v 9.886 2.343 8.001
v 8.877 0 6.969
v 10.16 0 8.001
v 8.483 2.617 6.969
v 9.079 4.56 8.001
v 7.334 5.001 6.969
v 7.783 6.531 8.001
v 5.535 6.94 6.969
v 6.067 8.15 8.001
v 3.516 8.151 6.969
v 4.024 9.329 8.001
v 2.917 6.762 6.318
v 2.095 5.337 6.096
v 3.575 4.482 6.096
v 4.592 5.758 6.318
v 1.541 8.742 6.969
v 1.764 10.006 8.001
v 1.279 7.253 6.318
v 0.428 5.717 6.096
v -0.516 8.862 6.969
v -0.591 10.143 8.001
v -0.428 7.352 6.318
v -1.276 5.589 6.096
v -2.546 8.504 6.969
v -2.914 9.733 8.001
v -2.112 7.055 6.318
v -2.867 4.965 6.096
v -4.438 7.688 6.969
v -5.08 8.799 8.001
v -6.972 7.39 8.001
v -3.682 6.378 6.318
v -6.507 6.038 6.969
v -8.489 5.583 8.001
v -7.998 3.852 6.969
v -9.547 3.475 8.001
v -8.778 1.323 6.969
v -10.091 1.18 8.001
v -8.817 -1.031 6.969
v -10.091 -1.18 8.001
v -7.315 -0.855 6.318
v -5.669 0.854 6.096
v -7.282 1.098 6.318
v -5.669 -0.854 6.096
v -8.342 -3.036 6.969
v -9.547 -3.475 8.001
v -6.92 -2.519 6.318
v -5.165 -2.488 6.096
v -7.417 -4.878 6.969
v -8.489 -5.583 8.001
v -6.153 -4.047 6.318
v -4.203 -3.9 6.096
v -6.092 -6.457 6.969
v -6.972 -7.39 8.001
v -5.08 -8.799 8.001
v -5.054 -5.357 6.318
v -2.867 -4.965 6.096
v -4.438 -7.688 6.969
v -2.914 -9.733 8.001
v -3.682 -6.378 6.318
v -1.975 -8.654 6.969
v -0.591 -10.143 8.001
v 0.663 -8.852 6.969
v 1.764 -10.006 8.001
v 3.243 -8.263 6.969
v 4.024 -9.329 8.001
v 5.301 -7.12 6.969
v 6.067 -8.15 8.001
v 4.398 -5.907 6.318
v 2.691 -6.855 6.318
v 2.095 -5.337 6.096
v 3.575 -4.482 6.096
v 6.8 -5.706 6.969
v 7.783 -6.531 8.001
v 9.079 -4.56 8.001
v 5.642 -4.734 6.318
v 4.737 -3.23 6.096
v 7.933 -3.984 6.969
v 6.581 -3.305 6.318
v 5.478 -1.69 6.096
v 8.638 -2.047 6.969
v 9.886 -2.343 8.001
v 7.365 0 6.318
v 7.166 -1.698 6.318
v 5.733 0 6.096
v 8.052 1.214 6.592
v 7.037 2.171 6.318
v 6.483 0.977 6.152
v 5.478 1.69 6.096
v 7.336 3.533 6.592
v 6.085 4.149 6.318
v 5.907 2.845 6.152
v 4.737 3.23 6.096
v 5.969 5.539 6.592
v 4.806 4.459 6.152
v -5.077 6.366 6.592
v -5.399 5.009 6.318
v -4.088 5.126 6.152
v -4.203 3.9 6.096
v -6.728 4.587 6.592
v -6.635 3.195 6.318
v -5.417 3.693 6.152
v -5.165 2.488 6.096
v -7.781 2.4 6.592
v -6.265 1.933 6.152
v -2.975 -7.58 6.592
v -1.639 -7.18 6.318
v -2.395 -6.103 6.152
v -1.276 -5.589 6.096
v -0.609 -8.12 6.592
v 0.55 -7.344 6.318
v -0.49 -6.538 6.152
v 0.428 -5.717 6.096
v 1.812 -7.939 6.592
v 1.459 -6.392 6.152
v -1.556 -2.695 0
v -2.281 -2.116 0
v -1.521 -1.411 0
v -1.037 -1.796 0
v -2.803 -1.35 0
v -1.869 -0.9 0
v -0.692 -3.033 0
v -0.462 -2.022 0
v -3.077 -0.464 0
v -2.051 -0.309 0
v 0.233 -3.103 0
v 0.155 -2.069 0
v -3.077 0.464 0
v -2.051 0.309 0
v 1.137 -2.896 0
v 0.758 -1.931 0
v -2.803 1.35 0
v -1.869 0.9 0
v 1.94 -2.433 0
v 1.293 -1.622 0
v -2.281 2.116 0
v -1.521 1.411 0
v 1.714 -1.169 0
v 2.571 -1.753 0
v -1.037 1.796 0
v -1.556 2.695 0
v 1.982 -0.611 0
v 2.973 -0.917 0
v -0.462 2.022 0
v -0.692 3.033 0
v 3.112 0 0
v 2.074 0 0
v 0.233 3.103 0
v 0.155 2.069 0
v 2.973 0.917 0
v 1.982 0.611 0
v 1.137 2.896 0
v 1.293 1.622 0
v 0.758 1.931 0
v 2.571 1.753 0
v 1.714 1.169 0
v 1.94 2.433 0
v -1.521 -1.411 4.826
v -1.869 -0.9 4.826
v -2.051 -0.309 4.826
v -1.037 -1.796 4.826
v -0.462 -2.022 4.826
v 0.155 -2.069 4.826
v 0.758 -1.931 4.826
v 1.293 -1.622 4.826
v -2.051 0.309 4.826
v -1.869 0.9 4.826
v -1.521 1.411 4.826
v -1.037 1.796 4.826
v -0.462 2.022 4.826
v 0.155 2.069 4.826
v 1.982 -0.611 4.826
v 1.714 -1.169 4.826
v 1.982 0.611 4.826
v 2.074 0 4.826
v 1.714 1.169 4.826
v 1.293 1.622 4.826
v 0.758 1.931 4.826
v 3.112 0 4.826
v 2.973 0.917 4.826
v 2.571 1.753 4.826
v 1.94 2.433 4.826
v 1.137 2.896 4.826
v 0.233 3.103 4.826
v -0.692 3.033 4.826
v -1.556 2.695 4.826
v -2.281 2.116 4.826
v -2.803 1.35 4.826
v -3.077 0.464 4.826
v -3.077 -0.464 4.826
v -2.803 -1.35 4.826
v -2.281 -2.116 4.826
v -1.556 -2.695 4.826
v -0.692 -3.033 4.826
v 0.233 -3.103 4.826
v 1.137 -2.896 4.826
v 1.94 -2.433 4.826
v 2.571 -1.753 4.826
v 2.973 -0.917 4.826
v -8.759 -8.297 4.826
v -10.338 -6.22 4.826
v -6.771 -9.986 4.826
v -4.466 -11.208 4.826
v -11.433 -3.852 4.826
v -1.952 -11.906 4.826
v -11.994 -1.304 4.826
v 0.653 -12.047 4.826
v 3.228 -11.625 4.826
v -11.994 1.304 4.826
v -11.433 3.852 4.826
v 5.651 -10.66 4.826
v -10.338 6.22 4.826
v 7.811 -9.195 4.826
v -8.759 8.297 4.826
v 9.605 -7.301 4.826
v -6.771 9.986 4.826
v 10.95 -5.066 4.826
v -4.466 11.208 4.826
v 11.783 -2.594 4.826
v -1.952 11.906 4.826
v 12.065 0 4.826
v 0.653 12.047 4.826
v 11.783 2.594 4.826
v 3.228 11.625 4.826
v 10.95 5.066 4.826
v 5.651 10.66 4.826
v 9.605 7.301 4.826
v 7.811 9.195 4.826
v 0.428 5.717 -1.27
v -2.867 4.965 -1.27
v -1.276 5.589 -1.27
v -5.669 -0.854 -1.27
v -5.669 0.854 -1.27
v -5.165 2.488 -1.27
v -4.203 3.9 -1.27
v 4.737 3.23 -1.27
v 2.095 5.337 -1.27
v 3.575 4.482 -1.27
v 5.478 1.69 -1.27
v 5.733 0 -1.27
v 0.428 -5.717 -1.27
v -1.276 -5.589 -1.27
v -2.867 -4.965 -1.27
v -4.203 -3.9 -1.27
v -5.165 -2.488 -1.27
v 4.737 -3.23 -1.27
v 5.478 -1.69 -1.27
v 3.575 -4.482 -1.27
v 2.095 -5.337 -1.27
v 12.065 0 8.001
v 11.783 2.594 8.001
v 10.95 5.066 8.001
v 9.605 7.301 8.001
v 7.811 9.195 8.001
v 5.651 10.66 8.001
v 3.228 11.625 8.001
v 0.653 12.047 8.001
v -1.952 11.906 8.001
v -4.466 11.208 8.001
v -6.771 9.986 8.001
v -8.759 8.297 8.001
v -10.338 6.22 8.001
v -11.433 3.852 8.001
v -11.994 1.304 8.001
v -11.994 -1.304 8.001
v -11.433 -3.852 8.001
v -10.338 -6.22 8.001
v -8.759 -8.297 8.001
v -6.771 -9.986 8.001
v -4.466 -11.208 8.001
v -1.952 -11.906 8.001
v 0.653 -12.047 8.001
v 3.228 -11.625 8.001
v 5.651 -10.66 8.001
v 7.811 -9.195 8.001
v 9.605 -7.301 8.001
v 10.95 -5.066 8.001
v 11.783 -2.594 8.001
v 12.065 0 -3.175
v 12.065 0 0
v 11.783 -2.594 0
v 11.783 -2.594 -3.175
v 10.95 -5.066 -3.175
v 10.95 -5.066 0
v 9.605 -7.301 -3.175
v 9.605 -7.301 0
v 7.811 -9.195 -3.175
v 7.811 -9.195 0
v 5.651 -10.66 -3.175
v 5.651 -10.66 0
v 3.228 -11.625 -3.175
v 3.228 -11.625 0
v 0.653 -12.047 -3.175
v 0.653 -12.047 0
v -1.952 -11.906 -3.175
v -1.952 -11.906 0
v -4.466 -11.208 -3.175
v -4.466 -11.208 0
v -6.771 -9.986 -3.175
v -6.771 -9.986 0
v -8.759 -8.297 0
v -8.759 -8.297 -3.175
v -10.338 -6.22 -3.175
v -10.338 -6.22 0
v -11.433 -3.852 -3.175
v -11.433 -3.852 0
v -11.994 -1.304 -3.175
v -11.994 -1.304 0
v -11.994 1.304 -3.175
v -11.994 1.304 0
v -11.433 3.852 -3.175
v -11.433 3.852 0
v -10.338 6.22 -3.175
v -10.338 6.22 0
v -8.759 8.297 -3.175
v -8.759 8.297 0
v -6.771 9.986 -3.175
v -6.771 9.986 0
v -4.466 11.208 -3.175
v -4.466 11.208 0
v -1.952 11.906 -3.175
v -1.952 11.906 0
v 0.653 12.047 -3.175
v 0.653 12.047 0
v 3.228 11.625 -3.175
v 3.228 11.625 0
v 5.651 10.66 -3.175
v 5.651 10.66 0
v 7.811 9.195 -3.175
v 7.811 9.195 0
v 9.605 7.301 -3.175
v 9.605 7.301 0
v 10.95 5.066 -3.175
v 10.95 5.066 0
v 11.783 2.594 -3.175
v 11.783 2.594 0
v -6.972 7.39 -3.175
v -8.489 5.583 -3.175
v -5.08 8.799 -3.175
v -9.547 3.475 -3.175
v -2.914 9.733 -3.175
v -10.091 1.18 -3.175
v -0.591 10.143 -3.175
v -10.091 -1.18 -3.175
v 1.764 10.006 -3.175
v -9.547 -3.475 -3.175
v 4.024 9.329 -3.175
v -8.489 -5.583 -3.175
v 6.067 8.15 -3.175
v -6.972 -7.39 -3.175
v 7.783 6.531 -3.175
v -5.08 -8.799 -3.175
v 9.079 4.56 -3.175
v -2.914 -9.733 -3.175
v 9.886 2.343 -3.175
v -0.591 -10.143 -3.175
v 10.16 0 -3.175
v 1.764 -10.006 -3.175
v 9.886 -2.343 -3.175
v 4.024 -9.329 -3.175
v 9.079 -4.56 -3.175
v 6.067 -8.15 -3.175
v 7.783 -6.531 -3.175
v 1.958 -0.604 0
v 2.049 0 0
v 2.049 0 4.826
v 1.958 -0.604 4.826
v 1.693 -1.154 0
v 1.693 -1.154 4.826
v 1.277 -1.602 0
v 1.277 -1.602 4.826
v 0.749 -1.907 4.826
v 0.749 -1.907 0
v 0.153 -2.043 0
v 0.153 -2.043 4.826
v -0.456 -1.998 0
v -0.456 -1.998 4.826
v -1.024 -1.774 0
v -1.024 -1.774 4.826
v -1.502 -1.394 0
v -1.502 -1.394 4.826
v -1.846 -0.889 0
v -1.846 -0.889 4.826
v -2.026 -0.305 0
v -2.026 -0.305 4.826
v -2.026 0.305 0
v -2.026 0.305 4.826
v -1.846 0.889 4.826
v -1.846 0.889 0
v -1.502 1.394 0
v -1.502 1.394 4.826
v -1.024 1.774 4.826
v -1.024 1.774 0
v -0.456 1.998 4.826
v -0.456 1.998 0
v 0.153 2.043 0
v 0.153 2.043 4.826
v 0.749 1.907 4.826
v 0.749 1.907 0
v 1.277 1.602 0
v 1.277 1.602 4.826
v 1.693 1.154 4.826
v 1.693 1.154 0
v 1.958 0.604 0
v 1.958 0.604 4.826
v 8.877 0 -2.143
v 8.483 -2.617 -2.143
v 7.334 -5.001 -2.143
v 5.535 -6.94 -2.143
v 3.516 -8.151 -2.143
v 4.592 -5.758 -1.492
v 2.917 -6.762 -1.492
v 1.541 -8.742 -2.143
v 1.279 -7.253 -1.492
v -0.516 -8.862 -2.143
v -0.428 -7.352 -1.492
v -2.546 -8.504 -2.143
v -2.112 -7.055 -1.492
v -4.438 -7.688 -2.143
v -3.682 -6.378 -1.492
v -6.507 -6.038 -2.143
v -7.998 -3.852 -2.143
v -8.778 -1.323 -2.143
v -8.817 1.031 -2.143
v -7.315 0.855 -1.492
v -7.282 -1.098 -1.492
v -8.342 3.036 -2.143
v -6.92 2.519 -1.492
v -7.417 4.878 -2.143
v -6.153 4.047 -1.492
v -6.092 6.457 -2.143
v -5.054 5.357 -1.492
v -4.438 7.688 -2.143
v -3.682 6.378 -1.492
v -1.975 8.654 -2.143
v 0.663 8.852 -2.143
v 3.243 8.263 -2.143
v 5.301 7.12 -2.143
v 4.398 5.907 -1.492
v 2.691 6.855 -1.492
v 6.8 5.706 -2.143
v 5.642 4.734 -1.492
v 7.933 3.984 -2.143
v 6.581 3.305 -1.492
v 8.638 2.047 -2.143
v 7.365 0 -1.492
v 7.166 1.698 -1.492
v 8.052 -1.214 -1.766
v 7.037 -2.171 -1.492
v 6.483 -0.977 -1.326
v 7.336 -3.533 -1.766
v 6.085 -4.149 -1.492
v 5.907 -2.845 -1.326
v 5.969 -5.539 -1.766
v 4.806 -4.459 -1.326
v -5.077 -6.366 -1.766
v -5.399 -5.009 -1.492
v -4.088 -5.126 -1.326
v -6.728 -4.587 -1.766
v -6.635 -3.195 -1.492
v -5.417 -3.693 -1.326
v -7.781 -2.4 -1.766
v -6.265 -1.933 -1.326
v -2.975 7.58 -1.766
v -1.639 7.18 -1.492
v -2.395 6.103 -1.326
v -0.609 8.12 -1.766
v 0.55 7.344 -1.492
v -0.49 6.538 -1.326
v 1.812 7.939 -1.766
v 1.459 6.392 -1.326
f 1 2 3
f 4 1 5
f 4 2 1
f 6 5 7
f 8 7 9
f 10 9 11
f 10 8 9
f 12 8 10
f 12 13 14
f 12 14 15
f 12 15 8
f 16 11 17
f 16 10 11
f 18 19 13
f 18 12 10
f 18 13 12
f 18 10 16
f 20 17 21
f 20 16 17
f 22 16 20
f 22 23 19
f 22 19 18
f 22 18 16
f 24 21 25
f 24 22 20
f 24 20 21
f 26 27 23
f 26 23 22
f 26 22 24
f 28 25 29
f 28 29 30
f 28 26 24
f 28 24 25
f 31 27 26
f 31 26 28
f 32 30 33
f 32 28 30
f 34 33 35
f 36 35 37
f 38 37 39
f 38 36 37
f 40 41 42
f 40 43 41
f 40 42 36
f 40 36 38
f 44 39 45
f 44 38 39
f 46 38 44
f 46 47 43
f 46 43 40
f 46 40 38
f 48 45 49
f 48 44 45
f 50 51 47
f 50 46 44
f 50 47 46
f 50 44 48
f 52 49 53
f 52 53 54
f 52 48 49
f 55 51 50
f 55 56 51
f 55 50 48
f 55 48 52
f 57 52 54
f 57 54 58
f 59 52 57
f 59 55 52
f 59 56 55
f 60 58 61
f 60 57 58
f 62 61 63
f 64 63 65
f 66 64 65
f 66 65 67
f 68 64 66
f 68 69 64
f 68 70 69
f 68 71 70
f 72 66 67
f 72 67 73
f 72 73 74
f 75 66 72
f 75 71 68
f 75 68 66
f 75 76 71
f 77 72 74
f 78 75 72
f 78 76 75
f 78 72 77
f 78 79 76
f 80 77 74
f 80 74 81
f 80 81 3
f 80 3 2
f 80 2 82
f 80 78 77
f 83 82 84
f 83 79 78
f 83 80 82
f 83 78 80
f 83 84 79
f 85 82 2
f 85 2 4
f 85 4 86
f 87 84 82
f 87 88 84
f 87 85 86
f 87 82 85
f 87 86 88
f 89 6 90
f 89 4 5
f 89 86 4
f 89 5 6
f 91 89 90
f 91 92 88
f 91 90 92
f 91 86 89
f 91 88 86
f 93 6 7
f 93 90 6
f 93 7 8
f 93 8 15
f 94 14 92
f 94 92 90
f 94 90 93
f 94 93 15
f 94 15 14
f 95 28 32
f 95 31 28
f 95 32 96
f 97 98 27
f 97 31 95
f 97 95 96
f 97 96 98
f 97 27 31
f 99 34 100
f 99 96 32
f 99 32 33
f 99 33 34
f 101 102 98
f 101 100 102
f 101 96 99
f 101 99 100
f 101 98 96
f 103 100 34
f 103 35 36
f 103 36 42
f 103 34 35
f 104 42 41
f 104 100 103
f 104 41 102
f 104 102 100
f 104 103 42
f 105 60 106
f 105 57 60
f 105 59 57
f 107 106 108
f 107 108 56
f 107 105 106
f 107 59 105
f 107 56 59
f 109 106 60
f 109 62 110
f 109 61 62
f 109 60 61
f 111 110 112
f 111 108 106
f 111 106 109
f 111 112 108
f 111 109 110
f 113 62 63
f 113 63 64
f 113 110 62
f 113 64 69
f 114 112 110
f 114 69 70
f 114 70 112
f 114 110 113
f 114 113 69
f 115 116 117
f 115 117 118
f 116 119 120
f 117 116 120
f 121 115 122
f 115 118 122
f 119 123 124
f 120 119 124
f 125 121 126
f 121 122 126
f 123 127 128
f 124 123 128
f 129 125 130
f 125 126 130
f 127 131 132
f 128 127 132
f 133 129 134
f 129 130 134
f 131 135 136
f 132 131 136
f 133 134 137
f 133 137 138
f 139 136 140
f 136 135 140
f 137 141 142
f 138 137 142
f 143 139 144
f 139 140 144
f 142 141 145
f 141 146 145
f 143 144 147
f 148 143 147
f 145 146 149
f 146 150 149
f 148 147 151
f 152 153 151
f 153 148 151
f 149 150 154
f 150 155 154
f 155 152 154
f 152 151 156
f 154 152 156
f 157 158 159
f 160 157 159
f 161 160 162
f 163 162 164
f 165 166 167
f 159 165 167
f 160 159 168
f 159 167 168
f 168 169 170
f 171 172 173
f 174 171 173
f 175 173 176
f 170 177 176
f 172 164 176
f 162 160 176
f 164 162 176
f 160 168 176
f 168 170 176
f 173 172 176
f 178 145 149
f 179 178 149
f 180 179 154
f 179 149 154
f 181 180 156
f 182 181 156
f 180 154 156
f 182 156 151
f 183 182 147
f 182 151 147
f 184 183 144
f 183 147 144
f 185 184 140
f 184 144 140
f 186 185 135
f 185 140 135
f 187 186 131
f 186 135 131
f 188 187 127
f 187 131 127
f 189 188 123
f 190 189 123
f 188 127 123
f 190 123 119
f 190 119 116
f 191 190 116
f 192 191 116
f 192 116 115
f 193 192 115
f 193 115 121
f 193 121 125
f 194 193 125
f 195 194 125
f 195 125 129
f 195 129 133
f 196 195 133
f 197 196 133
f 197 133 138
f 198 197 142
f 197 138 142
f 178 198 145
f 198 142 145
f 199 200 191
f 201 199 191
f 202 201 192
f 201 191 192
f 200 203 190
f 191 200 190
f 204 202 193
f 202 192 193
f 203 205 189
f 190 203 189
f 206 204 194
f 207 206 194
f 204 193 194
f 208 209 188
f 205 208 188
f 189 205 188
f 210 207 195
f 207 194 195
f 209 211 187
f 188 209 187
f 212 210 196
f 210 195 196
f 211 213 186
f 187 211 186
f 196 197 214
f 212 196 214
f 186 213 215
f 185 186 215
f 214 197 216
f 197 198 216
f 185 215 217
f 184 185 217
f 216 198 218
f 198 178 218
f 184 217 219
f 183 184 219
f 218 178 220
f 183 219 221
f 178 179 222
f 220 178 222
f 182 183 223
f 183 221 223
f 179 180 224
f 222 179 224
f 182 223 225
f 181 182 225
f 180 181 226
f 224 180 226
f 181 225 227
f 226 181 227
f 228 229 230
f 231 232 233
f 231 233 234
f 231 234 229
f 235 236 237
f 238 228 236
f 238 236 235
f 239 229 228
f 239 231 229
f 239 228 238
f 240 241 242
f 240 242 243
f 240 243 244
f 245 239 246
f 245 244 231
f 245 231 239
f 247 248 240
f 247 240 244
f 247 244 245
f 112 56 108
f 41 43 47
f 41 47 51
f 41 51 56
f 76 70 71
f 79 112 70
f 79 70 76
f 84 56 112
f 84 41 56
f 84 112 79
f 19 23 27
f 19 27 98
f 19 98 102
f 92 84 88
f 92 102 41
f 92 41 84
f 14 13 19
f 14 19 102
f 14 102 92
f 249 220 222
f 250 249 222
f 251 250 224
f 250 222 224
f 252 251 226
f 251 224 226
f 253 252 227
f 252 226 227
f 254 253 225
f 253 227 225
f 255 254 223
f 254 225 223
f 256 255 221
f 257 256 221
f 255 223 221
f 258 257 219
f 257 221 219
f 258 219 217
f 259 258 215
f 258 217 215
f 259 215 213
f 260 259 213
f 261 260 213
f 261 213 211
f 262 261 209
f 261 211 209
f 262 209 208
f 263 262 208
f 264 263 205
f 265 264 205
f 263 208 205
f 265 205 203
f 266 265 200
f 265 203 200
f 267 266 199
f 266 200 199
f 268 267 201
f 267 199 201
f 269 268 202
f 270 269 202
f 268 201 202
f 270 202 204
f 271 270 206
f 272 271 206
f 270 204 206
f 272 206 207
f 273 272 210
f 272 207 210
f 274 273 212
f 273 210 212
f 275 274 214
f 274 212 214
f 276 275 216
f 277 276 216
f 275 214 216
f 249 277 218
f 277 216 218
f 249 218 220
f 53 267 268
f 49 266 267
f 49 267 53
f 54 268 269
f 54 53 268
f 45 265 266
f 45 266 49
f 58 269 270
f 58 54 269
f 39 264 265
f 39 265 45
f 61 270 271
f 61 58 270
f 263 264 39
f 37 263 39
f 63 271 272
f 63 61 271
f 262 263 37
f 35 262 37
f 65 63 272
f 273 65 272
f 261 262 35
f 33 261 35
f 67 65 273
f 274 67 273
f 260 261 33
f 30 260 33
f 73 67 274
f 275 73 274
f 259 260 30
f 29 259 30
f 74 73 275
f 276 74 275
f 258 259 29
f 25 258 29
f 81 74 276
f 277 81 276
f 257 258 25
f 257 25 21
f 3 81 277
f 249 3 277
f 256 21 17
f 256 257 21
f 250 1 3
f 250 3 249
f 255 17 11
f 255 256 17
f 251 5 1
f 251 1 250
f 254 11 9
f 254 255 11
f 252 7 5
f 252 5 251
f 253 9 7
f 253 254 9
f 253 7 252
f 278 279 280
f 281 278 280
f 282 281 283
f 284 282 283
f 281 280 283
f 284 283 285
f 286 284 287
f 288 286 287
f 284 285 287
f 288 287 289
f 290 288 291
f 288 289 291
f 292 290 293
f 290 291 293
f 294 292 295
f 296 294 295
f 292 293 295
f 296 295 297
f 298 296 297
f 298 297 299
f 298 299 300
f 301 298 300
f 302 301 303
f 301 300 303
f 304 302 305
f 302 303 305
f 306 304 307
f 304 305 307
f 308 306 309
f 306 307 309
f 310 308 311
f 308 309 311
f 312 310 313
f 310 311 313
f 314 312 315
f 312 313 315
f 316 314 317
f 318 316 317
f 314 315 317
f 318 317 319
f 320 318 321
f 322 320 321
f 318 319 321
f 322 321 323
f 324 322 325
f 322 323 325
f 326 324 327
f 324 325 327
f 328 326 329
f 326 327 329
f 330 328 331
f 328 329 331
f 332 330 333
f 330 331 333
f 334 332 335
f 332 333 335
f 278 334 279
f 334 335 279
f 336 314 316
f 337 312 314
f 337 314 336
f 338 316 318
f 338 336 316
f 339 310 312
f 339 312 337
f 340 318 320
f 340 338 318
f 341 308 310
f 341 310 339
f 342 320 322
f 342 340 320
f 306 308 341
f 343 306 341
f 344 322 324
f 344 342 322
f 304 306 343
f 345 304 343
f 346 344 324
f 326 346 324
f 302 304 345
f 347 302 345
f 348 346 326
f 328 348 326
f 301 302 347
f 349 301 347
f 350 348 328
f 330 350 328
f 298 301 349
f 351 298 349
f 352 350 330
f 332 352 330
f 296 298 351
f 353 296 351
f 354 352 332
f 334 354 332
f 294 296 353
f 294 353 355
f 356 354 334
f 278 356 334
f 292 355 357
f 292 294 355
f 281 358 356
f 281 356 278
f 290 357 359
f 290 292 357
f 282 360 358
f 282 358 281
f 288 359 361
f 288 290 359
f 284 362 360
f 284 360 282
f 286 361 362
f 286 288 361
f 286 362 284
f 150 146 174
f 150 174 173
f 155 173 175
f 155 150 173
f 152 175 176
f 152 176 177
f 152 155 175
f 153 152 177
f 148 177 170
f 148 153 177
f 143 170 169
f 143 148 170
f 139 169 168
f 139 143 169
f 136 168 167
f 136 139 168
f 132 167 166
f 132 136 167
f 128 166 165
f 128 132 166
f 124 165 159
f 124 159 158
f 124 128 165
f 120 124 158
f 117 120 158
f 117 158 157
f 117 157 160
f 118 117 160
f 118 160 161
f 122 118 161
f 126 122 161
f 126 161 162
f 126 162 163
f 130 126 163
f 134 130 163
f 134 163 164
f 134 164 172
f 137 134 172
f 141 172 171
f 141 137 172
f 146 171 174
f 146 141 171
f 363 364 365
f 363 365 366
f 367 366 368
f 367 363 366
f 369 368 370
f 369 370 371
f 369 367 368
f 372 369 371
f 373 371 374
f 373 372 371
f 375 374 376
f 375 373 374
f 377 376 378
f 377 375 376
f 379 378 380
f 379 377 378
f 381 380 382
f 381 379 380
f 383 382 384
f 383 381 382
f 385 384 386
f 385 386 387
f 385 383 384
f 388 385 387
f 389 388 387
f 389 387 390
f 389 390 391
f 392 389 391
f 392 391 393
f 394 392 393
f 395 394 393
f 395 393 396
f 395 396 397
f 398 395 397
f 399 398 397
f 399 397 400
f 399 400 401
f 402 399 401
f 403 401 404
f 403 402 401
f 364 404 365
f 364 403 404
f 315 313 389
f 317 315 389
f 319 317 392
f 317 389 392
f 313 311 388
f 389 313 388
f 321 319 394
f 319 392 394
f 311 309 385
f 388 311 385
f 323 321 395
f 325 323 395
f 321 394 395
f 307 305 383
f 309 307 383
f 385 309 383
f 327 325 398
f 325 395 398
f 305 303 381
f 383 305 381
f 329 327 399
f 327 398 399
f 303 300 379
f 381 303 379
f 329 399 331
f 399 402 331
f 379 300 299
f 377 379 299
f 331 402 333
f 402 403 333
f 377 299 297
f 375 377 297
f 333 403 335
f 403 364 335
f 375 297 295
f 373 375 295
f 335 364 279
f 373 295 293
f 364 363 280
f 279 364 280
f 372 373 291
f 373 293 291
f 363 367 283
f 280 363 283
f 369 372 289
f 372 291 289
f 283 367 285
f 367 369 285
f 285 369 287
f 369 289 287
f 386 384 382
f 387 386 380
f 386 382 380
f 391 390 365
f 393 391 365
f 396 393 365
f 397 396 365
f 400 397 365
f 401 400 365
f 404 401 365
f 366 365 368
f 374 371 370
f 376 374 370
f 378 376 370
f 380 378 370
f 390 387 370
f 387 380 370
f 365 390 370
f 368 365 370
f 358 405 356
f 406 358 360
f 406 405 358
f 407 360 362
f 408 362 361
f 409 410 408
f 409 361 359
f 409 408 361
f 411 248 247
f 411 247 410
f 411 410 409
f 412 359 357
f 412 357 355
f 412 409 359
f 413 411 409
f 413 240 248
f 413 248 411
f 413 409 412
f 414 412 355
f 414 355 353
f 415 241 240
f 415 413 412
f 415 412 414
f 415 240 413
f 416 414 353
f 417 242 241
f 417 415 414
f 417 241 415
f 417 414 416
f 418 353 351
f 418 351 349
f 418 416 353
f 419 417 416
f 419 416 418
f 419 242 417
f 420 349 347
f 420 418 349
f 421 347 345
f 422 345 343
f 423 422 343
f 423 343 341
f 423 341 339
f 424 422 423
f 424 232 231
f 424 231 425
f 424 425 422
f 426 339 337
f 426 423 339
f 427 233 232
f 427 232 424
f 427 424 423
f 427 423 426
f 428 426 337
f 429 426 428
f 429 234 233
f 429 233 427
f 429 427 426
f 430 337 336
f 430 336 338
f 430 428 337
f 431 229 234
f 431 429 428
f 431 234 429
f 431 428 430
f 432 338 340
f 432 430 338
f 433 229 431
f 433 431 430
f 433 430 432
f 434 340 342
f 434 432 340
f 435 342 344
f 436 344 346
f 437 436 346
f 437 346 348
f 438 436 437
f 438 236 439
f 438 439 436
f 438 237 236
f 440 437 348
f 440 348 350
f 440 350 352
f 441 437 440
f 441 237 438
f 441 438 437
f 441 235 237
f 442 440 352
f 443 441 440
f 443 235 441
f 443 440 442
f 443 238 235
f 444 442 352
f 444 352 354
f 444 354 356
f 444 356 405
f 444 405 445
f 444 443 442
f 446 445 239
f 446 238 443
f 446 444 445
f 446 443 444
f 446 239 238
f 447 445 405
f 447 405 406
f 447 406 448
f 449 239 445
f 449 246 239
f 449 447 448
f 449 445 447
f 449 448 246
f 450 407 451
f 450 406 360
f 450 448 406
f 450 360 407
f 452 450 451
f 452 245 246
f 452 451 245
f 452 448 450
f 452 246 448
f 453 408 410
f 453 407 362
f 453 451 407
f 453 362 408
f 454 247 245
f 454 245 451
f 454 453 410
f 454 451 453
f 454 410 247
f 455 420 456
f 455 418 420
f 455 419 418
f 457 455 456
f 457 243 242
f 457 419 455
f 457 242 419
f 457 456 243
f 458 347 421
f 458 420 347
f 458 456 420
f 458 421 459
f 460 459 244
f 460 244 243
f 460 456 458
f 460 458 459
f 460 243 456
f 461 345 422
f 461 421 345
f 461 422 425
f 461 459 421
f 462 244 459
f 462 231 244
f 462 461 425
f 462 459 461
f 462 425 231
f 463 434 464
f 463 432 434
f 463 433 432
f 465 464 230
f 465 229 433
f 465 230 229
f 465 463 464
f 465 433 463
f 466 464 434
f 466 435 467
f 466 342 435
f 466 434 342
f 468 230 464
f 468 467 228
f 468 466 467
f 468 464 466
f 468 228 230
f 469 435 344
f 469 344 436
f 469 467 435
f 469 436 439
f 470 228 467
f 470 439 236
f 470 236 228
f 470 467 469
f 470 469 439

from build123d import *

# Parameters (mm, degrees)
F0_R      = 3.1115
F0_R_2    = 2.0743333333
F1_DEPTH  = 4.826
F2_R      = 12.065
F3_DEPTH  = 3.175
F4_R      = 10.16
F5_DEPTH  = 1.905
F6_R      = 2.0489333333
F7_DEPTH  = 4.826
F8_R      = 12.065
F9_DEPTH  = 3.175
F10_R     = 10.16
F11_DEPTH = 1.905


# Not quite as in the source:
# - a fillet or chamfer that OpenCascade refuses, or shapes differently, is made with other operations: its cross-section is extruded or revolved along the edge and cut away or added


with BuildPart() as f1:
    # F0 (on Top) → F1 (new body)
    with BuildSketch(Plane.XY):
        Circle(F0_R)
        Circle(F0_R_2, mode=Mode.SUBTRACT)
    extrude(amount=F1_DEPTH)

    # F2 (on face) → F3 (join)
    with BuildSketch(Plane.XY.offset(4.826)):
        Circle(F2_R)
    extrude(amount=F3_DEPTH)

    # F4 (on face) → F5 (cut)
    with BuildSketch(Plane.XY.offset(8.001)):
        Circle(F4_R)
    extrude(amount=-F5_DEPTH, mode=Mode.SUBTRACT)

    # F12: fillet of radius 6.096 on 1 edges, made by hand

    # F12_s1 → F12_t2 (revolve)
    with BuildSketch(Plane.XZ):
        with BuildLine():
            ThreePointArc((10.16, 8.001), (8.1428356123, 6.592466448), (5.7331800353, 6.096))
            Line((5.7331800353, 6.096), (10.16, 6.096))
            Line((10.16, 6.096), (10.16, 8.001))
        make_face()
    revolve(axis=Axis((0, 0, 6.096), (0, 0, 1)))


with BuildPart() as f7:
    # F6 (on face) → F7 (new body)
    with BuildSketch(Plane(origin=(0, 0, 0), x_dir=(1, 0, 0), z_dir=(0, 0, -1))):
        Circle(F6_R)
    extrude(amount=-F7_DEPTH)

    # F8 (on face) → F9 (join)
    with BuildSketch(Plane(origin=(0, 0, 0), x_dir=(1, 0, 0), z_dir=(0, 0, -1))):
        Circle(F8_R)
    extrude(amount=F9_DEPTH)

    # F10 (on face) → F11 (cut)
    with BuildSketch(Plane(origin=(0, 0, -3.175), x_dir=(1, 0, 0), z_dir=(0, 0, -1))):
        Circle(F10_R)
    extrude(amount=-F11_DEPTH, mode=Mode.SUBTRACT)

    # F12#2: fillet of radius 6.096 on 1 edges, made by hand

    # F12_2_s1 → F12_2_t2 (revolve)
    with BuildSketch(Plane.XZ):
        with BuildLine():
            ThreePointArc((10.16, -3.175), (8.1428356123, -1.766466448), (5.7331800353, -1.27))
            Line((5.7331800353, -1.27), (10.16, -1.27))
            Line((10.16, -1.27), (10.16, -3.175))
        make_face()
    revolve(axis=Axis((0, 0, -1.27), (0, 0, -1)))


solid = Compound([f1.part, f7.part])
